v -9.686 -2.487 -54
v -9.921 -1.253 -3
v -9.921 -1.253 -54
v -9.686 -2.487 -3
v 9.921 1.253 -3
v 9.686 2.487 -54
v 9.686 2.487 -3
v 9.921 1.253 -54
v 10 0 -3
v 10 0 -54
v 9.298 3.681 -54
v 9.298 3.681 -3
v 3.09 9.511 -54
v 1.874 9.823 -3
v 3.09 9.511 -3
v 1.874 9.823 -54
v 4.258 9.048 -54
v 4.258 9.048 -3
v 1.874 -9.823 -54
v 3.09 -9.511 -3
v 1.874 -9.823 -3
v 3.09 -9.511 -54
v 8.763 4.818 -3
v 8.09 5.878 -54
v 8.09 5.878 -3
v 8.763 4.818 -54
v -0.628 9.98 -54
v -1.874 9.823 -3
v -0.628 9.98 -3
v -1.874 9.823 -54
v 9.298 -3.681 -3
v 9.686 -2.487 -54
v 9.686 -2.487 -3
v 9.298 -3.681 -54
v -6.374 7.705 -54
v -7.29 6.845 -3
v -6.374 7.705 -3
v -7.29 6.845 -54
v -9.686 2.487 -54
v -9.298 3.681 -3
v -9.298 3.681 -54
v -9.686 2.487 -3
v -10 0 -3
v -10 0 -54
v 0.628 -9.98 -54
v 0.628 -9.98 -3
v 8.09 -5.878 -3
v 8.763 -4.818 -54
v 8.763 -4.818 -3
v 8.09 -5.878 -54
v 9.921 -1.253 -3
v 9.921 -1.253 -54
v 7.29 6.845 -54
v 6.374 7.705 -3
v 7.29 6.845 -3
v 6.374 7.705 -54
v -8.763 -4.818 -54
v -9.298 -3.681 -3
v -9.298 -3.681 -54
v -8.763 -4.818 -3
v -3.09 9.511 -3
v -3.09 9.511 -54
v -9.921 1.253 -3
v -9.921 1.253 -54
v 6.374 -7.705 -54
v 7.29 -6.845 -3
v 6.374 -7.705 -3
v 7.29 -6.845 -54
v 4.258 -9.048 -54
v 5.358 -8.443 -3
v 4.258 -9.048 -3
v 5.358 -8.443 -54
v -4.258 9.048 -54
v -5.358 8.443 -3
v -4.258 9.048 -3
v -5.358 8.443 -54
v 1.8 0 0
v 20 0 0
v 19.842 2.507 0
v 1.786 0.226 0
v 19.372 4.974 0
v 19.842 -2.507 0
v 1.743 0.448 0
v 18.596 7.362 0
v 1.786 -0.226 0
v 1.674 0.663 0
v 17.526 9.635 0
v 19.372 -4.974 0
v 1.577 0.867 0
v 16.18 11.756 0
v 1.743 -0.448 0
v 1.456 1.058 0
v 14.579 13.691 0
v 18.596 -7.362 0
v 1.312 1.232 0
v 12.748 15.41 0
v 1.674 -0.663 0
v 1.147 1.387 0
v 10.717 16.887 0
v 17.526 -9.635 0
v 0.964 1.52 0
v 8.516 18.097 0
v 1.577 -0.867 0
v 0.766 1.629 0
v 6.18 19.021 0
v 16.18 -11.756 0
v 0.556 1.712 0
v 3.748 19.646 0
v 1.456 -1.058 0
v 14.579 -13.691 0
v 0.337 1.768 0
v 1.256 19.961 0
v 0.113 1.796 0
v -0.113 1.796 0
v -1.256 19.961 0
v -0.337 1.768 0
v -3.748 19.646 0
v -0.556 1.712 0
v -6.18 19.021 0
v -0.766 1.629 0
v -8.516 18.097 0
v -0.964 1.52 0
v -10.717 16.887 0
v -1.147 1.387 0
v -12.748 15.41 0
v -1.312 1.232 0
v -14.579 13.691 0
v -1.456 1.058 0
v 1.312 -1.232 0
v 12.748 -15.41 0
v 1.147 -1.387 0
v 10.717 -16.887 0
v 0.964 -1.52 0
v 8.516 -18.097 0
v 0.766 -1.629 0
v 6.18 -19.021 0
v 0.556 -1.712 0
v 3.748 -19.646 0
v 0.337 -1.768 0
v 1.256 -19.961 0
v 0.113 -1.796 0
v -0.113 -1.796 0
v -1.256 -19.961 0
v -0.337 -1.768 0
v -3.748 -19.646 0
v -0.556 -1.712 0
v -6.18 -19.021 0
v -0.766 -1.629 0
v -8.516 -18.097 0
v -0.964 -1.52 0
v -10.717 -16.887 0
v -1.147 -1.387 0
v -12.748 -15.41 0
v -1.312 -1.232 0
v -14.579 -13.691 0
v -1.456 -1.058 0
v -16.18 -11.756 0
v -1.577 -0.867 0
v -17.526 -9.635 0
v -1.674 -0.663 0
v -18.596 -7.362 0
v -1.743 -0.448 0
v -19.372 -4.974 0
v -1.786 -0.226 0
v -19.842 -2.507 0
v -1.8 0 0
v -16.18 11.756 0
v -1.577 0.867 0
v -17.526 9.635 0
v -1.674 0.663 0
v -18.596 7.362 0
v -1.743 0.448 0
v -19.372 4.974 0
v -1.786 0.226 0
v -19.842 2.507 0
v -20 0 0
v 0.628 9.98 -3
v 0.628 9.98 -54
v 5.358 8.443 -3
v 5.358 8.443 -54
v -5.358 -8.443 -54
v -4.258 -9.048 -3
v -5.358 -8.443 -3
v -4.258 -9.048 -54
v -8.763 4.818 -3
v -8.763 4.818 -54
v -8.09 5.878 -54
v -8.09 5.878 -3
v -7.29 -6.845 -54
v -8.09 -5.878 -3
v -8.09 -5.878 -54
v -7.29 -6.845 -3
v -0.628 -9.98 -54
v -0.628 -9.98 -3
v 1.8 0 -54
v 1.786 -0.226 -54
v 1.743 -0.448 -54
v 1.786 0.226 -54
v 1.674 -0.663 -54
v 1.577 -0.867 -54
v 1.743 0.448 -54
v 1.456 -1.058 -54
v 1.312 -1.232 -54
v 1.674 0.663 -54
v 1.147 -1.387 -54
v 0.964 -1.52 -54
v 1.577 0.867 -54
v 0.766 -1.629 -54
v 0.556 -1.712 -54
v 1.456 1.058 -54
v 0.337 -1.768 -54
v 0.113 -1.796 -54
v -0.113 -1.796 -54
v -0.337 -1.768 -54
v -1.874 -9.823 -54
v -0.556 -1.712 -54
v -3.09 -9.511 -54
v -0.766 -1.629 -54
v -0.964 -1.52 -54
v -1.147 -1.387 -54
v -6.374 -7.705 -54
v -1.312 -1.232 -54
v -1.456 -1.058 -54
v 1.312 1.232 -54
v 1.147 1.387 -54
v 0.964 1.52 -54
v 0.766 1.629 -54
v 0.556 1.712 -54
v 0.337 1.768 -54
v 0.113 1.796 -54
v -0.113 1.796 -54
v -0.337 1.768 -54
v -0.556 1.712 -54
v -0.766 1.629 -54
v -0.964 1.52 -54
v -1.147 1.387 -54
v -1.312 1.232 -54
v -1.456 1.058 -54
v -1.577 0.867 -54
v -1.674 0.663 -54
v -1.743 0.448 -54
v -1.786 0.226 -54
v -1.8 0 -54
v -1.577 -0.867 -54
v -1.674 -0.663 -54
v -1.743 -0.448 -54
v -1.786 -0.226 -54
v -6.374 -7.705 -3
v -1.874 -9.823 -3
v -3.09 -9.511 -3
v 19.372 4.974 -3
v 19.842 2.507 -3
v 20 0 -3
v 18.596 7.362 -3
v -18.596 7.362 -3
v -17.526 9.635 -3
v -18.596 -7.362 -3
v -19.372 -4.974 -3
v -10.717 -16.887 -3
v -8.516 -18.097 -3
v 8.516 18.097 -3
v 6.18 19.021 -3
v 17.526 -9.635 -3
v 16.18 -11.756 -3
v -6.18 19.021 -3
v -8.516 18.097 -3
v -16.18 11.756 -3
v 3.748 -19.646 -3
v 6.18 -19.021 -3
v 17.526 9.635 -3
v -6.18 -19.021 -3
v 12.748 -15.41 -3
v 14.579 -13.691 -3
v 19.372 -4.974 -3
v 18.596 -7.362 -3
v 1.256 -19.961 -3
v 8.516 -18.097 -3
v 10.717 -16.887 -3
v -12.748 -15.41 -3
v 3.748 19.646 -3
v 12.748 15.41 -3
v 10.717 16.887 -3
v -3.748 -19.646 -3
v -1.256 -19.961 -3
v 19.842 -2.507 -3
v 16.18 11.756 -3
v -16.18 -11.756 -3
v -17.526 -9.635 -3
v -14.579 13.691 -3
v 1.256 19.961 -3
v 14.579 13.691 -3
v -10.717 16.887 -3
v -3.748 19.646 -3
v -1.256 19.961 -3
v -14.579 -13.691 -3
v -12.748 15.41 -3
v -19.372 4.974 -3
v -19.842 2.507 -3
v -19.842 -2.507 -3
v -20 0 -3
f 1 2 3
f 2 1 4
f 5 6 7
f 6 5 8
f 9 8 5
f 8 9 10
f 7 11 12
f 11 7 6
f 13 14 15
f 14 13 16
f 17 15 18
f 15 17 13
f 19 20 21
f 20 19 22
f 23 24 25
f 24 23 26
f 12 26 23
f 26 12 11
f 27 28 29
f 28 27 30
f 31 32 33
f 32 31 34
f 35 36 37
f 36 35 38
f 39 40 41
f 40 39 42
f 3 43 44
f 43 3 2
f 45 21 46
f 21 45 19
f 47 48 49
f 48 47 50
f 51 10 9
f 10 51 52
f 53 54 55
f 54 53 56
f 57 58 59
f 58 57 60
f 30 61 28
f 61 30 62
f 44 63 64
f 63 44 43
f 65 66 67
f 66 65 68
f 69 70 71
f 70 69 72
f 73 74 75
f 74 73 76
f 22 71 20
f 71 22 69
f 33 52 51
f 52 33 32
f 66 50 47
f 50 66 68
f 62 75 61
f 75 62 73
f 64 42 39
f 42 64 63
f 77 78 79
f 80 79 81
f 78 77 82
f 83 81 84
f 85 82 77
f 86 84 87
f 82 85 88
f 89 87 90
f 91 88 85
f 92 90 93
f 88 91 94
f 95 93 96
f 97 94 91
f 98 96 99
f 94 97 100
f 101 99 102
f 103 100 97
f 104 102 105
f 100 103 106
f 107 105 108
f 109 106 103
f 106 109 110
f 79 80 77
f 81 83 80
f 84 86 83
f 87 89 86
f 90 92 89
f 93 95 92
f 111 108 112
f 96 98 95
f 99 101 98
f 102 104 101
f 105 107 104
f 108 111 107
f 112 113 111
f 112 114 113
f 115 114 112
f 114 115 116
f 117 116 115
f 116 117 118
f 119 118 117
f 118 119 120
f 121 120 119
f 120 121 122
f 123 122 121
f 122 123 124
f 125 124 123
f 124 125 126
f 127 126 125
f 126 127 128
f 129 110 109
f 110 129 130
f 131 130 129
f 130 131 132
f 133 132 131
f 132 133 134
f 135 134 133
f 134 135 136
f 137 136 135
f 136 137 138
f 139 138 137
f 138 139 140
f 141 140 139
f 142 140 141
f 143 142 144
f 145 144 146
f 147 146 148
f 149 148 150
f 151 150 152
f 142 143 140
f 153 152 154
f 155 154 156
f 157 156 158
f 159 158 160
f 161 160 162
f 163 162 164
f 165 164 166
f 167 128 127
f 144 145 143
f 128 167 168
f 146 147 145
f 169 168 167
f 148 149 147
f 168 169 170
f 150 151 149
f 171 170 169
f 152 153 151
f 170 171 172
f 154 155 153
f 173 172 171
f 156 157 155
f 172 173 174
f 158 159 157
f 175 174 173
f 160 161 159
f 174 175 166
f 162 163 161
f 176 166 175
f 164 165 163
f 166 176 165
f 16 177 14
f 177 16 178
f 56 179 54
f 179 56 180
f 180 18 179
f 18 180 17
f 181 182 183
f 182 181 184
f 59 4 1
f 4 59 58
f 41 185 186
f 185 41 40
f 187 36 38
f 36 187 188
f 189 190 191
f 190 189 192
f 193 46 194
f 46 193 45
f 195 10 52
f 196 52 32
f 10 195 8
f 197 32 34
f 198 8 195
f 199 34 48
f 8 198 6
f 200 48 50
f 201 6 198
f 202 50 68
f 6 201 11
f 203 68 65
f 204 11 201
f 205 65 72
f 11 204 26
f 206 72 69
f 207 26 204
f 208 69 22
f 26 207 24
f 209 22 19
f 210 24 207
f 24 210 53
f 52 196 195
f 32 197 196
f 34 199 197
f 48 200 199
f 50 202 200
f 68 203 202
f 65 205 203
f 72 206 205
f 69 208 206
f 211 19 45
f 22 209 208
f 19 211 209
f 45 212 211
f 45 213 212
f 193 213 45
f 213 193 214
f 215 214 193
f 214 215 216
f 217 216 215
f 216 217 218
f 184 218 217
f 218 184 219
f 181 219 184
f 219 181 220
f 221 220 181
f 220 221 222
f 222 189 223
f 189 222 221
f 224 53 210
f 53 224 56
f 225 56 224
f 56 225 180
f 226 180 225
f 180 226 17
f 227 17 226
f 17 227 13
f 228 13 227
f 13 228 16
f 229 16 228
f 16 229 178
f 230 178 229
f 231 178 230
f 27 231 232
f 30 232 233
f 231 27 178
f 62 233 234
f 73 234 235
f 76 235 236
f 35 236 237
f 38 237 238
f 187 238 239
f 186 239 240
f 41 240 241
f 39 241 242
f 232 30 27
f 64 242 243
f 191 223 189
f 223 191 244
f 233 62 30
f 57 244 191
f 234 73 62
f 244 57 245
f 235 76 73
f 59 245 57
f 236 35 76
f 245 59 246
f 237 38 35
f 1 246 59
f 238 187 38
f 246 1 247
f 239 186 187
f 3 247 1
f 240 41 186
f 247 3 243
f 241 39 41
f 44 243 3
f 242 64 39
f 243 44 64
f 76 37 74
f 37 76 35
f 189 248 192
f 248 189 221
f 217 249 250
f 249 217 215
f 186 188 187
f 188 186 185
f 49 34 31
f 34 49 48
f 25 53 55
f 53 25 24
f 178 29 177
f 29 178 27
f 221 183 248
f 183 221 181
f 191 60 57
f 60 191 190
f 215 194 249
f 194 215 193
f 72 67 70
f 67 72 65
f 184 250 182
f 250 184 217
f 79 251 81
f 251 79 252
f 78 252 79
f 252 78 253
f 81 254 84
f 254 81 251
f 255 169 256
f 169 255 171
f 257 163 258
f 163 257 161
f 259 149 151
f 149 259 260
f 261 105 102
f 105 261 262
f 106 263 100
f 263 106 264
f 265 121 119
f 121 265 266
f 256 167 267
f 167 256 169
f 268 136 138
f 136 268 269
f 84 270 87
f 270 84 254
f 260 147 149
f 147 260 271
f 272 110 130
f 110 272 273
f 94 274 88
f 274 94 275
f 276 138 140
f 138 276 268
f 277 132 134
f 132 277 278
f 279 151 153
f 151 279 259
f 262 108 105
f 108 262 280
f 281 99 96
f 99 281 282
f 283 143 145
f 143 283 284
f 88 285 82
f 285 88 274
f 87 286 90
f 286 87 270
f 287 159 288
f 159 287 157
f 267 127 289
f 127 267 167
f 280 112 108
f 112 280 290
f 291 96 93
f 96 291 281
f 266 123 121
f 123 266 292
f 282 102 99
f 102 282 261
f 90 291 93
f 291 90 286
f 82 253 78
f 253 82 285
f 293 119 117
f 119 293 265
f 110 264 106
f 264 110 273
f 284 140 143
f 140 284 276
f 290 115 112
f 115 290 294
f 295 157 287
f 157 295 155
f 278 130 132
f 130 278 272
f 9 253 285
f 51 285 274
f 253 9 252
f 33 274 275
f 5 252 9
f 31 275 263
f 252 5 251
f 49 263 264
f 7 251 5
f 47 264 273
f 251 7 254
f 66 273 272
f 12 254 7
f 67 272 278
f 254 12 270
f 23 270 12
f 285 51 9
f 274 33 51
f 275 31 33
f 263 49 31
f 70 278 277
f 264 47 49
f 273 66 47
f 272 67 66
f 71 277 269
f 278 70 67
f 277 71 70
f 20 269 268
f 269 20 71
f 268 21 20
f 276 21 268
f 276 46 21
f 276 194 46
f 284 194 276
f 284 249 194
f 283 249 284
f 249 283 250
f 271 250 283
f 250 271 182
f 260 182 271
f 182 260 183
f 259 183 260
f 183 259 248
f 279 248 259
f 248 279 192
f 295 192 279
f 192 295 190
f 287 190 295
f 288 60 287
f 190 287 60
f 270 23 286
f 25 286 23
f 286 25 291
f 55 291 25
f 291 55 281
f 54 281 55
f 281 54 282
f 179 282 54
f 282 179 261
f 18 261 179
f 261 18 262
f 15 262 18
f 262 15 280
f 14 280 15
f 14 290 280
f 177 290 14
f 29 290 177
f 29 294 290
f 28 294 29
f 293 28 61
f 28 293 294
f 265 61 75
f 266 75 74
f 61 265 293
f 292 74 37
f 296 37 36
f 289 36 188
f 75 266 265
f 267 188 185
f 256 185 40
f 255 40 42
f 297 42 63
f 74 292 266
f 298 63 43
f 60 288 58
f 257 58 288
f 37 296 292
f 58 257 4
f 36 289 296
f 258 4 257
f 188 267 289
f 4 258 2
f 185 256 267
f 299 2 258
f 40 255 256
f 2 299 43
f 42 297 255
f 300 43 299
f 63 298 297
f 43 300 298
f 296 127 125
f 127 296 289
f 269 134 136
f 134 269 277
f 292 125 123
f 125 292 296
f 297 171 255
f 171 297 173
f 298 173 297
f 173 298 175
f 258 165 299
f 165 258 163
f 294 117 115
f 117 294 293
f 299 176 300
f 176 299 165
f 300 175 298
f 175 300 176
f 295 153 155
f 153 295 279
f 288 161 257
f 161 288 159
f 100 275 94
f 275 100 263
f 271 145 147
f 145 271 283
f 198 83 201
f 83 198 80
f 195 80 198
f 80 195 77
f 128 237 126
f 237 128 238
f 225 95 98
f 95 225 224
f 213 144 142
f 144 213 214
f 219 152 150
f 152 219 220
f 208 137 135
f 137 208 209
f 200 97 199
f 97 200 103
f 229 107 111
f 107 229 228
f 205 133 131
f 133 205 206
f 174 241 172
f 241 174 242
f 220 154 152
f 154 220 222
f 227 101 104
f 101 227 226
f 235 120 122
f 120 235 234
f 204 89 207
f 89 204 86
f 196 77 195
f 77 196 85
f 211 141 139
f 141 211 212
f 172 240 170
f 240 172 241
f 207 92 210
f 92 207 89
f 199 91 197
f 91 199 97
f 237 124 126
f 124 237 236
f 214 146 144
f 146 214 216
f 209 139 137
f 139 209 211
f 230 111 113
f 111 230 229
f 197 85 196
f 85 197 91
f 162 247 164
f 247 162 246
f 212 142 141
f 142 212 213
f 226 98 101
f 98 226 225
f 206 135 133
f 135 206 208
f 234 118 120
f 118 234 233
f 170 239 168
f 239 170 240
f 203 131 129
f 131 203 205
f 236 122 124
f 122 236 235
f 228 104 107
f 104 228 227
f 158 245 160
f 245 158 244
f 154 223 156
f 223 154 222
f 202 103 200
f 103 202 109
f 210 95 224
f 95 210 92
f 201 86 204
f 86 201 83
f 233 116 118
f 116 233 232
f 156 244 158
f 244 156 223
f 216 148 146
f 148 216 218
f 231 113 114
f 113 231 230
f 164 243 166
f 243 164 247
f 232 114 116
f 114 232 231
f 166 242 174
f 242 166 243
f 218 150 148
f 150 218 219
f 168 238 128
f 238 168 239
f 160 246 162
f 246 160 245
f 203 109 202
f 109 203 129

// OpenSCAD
$fn = 50;


difference() {
	union() {
		translate(v = [0, 0, -54.0000000000]) {
			cylinder(h = 54, r = 10.0000000000);
		}
		translate(v = [0, 0, -3.0000000000]) {
			cylinder(h = 3, r = 20.0000000000);
		}
	}
	union() {
		#translate(v = [0, 0, -54]) {
			cylinder(h = 54, r = 1.8000000000);
		}
	}
}
